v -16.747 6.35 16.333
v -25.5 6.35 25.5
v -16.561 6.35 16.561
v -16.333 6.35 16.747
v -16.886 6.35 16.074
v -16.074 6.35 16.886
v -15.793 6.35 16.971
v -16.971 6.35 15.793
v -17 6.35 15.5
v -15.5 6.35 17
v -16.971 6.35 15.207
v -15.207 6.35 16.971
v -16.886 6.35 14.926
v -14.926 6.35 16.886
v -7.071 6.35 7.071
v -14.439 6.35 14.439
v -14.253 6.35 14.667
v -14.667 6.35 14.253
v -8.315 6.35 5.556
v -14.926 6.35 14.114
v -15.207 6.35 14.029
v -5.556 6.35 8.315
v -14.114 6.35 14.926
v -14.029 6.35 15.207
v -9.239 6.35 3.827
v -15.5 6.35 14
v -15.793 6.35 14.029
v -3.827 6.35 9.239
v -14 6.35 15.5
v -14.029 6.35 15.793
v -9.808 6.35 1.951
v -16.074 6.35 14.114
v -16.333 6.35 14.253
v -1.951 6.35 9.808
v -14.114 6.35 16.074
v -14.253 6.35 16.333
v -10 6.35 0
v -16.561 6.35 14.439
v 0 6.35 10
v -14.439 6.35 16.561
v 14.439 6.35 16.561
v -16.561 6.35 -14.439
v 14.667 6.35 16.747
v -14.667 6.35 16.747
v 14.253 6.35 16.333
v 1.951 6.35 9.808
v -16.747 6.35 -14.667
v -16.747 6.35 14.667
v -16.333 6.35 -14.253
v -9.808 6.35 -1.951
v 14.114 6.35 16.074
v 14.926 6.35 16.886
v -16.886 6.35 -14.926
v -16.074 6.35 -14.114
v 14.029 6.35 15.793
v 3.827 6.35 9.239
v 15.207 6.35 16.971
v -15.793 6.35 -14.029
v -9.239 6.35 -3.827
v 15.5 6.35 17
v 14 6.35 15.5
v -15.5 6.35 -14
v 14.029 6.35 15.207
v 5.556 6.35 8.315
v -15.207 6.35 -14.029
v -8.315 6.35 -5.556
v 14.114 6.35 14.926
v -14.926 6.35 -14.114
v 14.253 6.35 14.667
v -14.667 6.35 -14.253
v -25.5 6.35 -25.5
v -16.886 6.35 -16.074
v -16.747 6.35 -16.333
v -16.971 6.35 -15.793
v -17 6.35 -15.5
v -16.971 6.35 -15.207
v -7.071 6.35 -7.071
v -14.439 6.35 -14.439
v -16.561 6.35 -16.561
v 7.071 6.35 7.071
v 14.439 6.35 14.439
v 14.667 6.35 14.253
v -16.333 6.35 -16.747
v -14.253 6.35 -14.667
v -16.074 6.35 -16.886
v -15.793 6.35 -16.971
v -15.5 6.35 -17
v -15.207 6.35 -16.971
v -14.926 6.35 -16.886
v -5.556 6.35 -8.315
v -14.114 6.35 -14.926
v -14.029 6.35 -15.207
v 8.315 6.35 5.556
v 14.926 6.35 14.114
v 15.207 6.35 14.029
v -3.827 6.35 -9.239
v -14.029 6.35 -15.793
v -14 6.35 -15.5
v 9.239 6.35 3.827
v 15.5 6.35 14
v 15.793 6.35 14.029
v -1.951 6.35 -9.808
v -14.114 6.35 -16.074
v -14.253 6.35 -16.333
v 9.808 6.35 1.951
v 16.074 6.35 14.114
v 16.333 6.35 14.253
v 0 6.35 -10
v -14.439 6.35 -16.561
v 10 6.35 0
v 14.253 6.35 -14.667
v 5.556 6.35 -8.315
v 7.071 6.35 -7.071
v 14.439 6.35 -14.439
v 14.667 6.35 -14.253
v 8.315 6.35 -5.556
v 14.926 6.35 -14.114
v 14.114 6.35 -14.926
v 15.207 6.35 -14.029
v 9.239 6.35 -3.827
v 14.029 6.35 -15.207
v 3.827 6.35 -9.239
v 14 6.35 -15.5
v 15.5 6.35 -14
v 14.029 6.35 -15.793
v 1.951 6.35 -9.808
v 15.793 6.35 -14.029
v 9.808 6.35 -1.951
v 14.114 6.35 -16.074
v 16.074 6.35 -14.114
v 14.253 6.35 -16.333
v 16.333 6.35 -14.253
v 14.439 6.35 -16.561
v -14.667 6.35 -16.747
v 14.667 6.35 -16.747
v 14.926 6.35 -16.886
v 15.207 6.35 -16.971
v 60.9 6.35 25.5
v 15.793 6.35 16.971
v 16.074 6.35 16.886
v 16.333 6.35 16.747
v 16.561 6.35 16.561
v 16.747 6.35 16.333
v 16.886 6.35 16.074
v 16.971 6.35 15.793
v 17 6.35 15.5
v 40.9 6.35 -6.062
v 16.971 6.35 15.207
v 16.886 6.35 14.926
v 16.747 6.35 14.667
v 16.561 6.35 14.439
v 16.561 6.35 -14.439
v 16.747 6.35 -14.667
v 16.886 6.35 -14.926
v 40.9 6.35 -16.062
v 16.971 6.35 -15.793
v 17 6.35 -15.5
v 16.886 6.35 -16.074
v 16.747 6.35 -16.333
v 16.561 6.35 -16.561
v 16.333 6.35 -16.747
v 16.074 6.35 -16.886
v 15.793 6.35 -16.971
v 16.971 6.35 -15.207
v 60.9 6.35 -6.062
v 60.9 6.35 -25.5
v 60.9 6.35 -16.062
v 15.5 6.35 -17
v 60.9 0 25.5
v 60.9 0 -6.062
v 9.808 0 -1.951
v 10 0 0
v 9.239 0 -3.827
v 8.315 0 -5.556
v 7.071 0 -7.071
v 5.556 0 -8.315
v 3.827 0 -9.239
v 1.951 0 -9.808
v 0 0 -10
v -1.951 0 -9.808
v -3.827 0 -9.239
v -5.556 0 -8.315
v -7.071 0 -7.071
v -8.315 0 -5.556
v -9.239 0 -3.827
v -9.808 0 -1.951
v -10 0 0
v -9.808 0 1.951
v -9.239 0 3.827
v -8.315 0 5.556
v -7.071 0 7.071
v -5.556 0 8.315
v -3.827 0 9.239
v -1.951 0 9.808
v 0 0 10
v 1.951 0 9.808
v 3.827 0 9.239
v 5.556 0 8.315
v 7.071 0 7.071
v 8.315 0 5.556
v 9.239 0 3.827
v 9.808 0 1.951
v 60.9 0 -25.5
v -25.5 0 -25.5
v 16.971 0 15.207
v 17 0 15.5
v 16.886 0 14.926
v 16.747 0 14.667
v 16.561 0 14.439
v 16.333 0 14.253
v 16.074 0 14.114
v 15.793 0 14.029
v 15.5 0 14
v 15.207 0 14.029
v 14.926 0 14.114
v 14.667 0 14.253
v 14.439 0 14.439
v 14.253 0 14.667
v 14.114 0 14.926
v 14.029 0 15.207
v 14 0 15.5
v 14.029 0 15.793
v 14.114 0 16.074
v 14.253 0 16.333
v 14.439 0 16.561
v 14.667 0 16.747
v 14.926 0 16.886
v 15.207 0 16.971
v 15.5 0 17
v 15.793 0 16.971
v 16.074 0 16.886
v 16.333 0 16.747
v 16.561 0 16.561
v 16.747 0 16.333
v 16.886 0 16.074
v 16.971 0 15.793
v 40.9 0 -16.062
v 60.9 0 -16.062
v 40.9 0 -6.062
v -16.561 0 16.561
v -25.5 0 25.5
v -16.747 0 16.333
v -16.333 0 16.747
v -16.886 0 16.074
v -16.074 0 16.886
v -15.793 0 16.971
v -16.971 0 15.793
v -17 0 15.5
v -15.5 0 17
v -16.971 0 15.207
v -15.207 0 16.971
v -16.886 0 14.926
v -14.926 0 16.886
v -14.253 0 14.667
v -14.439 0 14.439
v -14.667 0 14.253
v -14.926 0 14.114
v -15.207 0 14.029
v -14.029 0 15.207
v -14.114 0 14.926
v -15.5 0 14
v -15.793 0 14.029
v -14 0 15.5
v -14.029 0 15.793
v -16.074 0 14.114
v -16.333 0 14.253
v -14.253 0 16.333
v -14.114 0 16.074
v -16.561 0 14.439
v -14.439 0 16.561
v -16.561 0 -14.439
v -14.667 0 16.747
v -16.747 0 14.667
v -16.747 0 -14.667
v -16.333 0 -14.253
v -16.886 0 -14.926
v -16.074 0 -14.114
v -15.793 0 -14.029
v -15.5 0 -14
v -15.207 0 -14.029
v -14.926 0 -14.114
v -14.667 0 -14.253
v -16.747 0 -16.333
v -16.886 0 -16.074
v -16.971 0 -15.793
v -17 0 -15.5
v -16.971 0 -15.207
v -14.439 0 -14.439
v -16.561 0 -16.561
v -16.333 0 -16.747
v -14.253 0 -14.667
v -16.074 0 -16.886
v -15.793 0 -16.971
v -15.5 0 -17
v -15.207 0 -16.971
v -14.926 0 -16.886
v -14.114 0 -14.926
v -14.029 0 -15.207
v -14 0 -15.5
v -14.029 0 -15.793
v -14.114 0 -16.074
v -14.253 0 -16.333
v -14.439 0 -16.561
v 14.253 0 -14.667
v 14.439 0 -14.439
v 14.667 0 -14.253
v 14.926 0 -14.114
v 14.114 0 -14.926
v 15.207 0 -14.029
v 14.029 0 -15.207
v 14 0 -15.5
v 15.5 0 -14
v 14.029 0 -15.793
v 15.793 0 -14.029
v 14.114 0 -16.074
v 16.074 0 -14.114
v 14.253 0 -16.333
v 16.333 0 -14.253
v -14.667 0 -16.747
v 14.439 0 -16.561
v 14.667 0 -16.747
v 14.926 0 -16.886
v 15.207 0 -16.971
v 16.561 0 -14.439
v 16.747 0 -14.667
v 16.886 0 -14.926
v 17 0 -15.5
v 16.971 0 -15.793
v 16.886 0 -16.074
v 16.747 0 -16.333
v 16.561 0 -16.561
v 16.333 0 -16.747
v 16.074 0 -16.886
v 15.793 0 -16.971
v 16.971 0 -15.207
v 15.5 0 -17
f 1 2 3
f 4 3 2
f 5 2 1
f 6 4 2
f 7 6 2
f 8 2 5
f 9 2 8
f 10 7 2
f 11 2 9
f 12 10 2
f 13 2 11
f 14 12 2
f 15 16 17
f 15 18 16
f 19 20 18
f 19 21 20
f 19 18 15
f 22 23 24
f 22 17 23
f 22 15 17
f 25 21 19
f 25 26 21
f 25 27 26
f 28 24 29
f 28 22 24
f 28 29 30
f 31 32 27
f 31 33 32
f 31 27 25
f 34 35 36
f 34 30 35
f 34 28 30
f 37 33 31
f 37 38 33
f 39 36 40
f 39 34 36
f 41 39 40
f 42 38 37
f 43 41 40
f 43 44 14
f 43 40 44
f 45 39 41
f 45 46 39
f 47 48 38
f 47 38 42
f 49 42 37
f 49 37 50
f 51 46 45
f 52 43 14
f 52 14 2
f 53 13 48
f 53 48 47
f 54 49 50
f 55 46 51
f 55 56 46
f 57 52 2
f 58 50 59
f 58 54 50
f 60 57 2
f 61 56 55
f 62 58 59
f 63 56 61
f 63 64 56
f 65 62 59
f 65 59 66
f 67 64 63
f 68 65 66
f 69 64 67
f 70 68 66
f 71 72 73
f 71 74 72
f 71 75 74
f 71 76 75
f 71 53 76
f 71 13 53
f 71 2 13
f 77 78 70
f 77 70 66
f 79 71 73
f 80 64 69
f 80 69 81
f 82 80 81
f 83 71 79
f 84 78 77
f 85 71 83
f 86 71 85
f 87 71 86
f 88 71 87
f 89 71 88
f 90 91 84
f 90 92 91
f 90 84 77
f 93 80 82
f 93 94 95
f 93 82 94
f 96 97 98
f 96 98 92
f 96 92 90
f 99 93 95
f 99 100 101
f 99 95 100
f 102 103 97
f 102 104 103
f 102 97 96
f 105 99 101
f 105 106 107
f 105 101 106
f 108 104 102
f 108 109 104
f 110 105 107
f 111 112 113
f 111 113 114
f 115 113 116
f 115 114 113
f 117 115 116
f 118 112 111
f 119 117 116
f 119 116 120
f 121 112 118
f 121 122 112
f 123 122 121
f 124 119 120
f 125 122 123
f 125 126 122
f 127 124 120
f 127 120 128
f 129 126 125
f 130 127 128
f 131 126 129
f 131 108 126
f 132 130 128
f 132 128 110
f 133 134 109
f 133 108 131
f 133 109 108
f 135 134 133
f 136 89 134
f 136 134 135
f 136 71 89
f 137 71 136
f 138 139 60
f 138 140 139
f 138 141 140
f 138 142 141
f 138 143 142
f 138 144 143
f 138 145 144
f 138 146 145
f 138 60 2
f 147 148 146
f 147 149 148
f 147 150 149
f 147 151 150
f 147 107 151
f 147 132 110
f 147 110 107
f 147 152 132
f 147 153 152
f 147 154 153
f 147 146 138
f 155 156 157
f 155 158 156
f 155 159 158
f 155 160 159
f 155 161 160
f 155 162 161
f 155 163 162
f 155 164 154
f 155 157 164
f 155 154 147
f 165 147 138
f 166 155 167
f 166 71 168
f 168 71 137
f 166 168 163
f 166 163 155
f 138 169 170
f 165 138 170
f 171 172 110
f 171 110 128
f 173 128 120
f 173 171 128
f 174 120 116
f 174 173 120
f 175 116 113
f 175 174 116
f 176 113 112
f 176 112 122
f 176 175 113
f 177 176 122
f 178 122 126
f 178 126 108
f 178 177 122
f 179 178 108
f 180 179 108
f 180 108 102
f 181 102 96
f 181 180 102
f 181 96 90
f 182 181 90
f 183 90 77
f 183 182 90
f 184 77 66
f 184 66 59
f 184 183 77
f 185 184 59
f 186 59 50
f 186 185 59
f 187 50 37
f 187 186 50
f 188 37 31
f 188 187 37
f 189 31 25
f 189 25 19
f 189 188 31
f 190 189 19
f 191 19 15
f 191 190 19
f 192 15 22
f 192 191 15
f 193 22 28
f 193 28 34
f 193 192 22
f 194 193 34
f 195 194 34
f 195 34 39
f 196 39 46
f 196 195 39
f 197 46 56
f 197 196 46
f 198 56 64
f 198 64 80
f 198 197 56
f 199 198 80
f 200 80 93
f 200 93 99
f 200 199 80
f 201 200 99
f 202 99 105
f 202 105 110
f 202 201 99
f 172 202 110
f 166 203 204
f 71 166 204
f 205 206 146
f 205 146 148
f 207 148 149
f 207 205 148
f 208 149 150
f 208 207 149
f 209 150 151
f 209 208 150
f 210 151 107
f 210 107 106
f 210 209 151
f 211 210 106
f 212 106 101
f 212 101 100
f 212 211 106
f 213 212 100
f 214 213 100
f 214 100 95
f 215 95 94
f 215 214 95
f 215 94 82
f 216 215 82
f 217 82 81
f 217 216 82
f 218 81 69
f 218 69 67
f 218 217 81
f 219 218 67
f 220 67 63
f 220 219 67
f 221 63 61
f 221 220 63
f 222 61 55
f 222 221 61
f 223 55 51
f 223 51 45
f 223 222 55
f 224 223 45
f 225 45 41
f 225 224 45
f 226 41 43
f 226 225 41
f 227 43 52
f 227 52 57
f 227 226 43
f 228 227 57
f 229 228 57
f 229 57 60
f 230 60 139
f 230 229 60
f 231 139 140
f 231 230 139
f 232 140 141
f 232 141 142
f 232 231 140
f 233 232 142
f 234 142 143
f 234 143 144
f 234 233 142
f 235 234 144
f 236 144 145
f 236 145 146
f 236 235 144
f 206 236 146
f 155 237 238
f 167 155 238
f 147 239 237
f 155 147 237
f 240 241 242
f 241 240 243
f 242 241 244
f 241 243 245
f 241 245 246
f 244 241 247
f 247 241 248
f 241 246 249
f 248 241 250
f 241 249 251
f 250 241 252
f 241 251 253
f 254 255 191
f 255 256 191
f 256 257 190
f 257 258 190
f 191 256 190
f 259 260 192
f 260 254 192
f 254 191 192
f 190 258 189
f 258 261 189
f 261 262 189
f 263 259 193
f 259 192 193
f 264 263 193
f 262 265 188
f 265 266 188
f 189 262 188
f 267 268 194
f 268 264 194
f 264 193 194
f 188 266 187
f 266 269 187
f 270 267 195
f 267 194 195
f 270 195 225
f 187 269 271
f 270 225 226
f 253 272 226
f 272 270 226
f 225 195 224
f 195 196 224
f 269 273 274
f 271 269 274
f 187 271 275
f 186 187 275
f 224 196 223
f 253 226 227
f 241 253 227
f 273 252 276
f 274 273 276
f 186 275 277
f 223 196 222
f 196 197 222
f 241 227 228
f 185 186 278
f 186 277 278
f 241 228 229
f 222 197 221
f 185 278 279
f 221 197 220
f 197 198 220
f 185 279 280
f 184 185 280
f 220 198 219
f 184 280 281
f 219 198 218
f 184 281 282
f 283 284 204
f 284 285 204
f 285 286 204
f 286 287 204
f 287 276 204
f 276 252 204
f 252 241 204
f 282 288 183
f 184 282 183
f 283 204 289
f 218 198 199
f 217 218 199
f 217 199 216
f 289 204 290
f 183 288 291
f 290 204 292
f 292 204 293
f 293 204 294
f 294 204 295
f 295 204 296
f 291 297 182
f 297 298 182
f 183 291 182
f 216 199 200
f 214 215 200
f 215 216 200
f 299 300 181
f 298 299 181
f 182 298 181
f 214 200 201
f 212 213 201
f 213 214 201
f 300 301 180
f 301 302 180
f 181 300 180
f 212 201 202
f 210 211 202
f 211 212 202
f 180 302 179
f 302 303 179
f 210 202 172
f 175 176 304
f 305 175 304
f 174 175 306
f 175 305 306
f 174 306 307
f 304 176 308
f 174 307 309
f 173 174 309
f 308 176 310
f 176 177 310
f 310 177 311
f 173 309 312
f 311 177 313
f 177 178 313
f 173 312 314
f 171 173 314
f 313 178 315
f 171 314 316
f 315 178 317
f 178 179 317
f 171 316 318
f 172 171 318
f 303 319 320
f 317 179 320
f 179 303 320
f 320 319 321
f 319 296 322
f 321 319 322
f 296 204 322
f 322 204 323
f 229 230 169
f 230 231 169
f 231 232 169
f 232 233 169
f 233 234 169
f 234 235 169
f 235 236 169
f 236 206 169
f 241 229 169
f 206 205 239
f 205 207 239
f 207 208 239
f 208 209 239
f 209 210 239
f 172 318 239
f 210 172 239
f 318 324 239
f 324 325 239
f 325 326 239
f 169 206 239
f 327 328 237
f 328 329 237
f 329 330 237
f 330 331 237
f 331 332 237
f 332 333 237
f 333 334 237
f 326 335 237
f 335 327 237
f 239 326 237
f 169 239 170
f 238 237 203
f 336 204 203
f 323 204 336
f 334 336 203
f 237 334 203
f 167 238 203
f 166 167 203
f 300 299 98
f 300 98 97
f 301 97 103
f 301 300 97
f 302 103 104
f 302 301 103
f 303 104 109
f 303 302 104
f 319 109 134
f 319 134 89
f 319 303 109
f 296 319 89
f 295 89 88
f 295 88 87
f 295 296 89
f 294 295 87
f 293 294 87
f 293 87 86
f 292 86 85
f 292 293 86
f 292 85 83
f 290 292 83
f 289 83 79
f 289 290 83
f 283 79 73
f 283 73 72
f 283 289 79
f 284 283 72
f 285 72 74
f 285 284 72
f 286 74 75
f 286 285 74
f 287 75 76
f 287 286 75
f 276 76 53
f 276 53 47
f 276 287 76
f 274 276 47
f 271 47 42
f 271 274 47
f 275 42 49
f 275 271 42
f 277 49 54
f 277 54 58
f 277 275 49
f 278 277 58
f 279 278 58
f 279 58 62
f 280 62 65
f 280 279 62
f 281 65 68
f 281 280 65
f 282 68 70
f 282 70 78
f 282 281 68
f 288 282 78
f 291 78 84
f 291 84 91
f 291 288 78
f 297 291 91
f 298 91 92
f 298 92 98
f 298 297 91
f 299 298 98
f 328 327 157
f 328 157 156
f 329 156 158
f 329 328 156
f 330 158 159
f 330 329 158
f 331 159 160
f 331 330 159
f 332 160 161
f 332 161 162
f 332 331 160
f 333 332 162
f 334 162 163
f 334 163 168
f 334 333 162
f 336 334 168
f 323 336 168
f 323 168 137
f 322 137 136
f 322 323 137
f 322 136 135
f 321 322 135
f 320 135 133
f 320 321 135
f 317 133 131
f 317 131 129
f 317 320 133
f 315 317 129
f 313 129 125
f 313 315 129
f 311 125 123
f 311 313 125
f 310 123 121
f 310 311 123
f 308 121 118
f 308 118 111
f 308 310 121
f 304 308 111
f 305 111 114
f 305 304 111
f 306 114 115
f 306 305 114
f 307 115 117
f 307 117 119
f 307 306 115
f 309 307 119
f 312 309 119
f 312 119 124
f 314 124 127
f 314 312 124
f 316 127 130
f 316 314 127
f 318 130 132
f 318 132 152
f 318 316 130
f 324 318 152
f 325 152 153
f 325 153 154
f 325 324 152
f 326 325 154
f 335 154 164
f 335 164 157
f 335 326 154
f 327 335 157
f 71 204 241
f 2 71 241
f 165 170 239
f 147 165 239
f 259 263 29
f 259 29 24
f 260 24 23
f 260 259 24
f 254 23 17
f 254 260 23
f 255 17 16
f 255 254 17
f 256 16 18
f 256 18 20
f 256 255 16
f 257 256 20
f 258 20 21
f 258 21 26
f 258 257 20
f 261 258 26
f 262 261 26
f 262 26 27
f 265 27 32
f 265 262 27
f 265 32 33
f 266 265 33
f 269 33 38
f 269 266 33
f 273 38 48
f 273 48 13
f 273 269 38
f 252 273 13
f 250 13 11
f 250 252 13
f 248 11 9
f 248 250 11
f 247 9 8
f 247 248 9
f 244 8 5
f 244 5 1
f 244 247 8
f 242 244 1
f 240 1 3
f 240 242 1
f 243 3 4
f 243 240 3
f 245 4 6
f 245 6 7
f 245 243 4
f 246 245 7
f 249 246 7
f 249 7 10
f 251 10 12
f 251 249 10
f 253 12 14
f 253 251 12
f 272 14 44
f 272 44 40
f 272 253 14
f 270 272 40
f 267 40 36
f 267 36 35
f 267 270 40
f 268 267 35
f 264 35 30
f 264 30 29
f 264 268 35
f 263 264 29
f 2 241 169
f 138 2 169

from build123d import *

# Parameters (mm, degrees)
SKETCH1_R           = 1.5
SKETCH1_R_2         = 10
BOSS_EXTRUDE1_DEPTH = 6.35


with BuildPart() as part:
    # Sketch1 → Boss-Extrude1 (new body)
    with BuildSketch(Plane(origin=(0, 0, 0), x_dir=(1, 0, 0), z_dir=(0, 1, 0))):
        Polygon((-25.5, 25.5), (-25.5, -25.5), (50.9, -25.5), (60.9, -25.5), (60.9, 6.061838244), (40.9, 6.061838244), (40.9, 16.061838244), (60.9, 16.061838244), (60.9, 25.5), align=None)
        with Locations((-15.5, 15.5)):
            Circle(SKETCH1_R, mode=Mode.SUBTRACT)
        with Locations((15.5, 15.5)):
            Circle(SKETCH1_R, mode=Mode.SUBTRACT)
        with Locations((15.5, -15.5)):
            Circle(SKETCH1_R, mode=Mode.SUBTRACT)
        with Locations((-15.5, -15.5)):
            Circle(SKETCH1_R, mode=Mode.SUBTRACT)
        Circle(SKETCH1_R_2, mode=Mode.SUBTRACT)
    extrude(amount=BOSS_EXTRUDE1_DEPTH)


solid = part.part
